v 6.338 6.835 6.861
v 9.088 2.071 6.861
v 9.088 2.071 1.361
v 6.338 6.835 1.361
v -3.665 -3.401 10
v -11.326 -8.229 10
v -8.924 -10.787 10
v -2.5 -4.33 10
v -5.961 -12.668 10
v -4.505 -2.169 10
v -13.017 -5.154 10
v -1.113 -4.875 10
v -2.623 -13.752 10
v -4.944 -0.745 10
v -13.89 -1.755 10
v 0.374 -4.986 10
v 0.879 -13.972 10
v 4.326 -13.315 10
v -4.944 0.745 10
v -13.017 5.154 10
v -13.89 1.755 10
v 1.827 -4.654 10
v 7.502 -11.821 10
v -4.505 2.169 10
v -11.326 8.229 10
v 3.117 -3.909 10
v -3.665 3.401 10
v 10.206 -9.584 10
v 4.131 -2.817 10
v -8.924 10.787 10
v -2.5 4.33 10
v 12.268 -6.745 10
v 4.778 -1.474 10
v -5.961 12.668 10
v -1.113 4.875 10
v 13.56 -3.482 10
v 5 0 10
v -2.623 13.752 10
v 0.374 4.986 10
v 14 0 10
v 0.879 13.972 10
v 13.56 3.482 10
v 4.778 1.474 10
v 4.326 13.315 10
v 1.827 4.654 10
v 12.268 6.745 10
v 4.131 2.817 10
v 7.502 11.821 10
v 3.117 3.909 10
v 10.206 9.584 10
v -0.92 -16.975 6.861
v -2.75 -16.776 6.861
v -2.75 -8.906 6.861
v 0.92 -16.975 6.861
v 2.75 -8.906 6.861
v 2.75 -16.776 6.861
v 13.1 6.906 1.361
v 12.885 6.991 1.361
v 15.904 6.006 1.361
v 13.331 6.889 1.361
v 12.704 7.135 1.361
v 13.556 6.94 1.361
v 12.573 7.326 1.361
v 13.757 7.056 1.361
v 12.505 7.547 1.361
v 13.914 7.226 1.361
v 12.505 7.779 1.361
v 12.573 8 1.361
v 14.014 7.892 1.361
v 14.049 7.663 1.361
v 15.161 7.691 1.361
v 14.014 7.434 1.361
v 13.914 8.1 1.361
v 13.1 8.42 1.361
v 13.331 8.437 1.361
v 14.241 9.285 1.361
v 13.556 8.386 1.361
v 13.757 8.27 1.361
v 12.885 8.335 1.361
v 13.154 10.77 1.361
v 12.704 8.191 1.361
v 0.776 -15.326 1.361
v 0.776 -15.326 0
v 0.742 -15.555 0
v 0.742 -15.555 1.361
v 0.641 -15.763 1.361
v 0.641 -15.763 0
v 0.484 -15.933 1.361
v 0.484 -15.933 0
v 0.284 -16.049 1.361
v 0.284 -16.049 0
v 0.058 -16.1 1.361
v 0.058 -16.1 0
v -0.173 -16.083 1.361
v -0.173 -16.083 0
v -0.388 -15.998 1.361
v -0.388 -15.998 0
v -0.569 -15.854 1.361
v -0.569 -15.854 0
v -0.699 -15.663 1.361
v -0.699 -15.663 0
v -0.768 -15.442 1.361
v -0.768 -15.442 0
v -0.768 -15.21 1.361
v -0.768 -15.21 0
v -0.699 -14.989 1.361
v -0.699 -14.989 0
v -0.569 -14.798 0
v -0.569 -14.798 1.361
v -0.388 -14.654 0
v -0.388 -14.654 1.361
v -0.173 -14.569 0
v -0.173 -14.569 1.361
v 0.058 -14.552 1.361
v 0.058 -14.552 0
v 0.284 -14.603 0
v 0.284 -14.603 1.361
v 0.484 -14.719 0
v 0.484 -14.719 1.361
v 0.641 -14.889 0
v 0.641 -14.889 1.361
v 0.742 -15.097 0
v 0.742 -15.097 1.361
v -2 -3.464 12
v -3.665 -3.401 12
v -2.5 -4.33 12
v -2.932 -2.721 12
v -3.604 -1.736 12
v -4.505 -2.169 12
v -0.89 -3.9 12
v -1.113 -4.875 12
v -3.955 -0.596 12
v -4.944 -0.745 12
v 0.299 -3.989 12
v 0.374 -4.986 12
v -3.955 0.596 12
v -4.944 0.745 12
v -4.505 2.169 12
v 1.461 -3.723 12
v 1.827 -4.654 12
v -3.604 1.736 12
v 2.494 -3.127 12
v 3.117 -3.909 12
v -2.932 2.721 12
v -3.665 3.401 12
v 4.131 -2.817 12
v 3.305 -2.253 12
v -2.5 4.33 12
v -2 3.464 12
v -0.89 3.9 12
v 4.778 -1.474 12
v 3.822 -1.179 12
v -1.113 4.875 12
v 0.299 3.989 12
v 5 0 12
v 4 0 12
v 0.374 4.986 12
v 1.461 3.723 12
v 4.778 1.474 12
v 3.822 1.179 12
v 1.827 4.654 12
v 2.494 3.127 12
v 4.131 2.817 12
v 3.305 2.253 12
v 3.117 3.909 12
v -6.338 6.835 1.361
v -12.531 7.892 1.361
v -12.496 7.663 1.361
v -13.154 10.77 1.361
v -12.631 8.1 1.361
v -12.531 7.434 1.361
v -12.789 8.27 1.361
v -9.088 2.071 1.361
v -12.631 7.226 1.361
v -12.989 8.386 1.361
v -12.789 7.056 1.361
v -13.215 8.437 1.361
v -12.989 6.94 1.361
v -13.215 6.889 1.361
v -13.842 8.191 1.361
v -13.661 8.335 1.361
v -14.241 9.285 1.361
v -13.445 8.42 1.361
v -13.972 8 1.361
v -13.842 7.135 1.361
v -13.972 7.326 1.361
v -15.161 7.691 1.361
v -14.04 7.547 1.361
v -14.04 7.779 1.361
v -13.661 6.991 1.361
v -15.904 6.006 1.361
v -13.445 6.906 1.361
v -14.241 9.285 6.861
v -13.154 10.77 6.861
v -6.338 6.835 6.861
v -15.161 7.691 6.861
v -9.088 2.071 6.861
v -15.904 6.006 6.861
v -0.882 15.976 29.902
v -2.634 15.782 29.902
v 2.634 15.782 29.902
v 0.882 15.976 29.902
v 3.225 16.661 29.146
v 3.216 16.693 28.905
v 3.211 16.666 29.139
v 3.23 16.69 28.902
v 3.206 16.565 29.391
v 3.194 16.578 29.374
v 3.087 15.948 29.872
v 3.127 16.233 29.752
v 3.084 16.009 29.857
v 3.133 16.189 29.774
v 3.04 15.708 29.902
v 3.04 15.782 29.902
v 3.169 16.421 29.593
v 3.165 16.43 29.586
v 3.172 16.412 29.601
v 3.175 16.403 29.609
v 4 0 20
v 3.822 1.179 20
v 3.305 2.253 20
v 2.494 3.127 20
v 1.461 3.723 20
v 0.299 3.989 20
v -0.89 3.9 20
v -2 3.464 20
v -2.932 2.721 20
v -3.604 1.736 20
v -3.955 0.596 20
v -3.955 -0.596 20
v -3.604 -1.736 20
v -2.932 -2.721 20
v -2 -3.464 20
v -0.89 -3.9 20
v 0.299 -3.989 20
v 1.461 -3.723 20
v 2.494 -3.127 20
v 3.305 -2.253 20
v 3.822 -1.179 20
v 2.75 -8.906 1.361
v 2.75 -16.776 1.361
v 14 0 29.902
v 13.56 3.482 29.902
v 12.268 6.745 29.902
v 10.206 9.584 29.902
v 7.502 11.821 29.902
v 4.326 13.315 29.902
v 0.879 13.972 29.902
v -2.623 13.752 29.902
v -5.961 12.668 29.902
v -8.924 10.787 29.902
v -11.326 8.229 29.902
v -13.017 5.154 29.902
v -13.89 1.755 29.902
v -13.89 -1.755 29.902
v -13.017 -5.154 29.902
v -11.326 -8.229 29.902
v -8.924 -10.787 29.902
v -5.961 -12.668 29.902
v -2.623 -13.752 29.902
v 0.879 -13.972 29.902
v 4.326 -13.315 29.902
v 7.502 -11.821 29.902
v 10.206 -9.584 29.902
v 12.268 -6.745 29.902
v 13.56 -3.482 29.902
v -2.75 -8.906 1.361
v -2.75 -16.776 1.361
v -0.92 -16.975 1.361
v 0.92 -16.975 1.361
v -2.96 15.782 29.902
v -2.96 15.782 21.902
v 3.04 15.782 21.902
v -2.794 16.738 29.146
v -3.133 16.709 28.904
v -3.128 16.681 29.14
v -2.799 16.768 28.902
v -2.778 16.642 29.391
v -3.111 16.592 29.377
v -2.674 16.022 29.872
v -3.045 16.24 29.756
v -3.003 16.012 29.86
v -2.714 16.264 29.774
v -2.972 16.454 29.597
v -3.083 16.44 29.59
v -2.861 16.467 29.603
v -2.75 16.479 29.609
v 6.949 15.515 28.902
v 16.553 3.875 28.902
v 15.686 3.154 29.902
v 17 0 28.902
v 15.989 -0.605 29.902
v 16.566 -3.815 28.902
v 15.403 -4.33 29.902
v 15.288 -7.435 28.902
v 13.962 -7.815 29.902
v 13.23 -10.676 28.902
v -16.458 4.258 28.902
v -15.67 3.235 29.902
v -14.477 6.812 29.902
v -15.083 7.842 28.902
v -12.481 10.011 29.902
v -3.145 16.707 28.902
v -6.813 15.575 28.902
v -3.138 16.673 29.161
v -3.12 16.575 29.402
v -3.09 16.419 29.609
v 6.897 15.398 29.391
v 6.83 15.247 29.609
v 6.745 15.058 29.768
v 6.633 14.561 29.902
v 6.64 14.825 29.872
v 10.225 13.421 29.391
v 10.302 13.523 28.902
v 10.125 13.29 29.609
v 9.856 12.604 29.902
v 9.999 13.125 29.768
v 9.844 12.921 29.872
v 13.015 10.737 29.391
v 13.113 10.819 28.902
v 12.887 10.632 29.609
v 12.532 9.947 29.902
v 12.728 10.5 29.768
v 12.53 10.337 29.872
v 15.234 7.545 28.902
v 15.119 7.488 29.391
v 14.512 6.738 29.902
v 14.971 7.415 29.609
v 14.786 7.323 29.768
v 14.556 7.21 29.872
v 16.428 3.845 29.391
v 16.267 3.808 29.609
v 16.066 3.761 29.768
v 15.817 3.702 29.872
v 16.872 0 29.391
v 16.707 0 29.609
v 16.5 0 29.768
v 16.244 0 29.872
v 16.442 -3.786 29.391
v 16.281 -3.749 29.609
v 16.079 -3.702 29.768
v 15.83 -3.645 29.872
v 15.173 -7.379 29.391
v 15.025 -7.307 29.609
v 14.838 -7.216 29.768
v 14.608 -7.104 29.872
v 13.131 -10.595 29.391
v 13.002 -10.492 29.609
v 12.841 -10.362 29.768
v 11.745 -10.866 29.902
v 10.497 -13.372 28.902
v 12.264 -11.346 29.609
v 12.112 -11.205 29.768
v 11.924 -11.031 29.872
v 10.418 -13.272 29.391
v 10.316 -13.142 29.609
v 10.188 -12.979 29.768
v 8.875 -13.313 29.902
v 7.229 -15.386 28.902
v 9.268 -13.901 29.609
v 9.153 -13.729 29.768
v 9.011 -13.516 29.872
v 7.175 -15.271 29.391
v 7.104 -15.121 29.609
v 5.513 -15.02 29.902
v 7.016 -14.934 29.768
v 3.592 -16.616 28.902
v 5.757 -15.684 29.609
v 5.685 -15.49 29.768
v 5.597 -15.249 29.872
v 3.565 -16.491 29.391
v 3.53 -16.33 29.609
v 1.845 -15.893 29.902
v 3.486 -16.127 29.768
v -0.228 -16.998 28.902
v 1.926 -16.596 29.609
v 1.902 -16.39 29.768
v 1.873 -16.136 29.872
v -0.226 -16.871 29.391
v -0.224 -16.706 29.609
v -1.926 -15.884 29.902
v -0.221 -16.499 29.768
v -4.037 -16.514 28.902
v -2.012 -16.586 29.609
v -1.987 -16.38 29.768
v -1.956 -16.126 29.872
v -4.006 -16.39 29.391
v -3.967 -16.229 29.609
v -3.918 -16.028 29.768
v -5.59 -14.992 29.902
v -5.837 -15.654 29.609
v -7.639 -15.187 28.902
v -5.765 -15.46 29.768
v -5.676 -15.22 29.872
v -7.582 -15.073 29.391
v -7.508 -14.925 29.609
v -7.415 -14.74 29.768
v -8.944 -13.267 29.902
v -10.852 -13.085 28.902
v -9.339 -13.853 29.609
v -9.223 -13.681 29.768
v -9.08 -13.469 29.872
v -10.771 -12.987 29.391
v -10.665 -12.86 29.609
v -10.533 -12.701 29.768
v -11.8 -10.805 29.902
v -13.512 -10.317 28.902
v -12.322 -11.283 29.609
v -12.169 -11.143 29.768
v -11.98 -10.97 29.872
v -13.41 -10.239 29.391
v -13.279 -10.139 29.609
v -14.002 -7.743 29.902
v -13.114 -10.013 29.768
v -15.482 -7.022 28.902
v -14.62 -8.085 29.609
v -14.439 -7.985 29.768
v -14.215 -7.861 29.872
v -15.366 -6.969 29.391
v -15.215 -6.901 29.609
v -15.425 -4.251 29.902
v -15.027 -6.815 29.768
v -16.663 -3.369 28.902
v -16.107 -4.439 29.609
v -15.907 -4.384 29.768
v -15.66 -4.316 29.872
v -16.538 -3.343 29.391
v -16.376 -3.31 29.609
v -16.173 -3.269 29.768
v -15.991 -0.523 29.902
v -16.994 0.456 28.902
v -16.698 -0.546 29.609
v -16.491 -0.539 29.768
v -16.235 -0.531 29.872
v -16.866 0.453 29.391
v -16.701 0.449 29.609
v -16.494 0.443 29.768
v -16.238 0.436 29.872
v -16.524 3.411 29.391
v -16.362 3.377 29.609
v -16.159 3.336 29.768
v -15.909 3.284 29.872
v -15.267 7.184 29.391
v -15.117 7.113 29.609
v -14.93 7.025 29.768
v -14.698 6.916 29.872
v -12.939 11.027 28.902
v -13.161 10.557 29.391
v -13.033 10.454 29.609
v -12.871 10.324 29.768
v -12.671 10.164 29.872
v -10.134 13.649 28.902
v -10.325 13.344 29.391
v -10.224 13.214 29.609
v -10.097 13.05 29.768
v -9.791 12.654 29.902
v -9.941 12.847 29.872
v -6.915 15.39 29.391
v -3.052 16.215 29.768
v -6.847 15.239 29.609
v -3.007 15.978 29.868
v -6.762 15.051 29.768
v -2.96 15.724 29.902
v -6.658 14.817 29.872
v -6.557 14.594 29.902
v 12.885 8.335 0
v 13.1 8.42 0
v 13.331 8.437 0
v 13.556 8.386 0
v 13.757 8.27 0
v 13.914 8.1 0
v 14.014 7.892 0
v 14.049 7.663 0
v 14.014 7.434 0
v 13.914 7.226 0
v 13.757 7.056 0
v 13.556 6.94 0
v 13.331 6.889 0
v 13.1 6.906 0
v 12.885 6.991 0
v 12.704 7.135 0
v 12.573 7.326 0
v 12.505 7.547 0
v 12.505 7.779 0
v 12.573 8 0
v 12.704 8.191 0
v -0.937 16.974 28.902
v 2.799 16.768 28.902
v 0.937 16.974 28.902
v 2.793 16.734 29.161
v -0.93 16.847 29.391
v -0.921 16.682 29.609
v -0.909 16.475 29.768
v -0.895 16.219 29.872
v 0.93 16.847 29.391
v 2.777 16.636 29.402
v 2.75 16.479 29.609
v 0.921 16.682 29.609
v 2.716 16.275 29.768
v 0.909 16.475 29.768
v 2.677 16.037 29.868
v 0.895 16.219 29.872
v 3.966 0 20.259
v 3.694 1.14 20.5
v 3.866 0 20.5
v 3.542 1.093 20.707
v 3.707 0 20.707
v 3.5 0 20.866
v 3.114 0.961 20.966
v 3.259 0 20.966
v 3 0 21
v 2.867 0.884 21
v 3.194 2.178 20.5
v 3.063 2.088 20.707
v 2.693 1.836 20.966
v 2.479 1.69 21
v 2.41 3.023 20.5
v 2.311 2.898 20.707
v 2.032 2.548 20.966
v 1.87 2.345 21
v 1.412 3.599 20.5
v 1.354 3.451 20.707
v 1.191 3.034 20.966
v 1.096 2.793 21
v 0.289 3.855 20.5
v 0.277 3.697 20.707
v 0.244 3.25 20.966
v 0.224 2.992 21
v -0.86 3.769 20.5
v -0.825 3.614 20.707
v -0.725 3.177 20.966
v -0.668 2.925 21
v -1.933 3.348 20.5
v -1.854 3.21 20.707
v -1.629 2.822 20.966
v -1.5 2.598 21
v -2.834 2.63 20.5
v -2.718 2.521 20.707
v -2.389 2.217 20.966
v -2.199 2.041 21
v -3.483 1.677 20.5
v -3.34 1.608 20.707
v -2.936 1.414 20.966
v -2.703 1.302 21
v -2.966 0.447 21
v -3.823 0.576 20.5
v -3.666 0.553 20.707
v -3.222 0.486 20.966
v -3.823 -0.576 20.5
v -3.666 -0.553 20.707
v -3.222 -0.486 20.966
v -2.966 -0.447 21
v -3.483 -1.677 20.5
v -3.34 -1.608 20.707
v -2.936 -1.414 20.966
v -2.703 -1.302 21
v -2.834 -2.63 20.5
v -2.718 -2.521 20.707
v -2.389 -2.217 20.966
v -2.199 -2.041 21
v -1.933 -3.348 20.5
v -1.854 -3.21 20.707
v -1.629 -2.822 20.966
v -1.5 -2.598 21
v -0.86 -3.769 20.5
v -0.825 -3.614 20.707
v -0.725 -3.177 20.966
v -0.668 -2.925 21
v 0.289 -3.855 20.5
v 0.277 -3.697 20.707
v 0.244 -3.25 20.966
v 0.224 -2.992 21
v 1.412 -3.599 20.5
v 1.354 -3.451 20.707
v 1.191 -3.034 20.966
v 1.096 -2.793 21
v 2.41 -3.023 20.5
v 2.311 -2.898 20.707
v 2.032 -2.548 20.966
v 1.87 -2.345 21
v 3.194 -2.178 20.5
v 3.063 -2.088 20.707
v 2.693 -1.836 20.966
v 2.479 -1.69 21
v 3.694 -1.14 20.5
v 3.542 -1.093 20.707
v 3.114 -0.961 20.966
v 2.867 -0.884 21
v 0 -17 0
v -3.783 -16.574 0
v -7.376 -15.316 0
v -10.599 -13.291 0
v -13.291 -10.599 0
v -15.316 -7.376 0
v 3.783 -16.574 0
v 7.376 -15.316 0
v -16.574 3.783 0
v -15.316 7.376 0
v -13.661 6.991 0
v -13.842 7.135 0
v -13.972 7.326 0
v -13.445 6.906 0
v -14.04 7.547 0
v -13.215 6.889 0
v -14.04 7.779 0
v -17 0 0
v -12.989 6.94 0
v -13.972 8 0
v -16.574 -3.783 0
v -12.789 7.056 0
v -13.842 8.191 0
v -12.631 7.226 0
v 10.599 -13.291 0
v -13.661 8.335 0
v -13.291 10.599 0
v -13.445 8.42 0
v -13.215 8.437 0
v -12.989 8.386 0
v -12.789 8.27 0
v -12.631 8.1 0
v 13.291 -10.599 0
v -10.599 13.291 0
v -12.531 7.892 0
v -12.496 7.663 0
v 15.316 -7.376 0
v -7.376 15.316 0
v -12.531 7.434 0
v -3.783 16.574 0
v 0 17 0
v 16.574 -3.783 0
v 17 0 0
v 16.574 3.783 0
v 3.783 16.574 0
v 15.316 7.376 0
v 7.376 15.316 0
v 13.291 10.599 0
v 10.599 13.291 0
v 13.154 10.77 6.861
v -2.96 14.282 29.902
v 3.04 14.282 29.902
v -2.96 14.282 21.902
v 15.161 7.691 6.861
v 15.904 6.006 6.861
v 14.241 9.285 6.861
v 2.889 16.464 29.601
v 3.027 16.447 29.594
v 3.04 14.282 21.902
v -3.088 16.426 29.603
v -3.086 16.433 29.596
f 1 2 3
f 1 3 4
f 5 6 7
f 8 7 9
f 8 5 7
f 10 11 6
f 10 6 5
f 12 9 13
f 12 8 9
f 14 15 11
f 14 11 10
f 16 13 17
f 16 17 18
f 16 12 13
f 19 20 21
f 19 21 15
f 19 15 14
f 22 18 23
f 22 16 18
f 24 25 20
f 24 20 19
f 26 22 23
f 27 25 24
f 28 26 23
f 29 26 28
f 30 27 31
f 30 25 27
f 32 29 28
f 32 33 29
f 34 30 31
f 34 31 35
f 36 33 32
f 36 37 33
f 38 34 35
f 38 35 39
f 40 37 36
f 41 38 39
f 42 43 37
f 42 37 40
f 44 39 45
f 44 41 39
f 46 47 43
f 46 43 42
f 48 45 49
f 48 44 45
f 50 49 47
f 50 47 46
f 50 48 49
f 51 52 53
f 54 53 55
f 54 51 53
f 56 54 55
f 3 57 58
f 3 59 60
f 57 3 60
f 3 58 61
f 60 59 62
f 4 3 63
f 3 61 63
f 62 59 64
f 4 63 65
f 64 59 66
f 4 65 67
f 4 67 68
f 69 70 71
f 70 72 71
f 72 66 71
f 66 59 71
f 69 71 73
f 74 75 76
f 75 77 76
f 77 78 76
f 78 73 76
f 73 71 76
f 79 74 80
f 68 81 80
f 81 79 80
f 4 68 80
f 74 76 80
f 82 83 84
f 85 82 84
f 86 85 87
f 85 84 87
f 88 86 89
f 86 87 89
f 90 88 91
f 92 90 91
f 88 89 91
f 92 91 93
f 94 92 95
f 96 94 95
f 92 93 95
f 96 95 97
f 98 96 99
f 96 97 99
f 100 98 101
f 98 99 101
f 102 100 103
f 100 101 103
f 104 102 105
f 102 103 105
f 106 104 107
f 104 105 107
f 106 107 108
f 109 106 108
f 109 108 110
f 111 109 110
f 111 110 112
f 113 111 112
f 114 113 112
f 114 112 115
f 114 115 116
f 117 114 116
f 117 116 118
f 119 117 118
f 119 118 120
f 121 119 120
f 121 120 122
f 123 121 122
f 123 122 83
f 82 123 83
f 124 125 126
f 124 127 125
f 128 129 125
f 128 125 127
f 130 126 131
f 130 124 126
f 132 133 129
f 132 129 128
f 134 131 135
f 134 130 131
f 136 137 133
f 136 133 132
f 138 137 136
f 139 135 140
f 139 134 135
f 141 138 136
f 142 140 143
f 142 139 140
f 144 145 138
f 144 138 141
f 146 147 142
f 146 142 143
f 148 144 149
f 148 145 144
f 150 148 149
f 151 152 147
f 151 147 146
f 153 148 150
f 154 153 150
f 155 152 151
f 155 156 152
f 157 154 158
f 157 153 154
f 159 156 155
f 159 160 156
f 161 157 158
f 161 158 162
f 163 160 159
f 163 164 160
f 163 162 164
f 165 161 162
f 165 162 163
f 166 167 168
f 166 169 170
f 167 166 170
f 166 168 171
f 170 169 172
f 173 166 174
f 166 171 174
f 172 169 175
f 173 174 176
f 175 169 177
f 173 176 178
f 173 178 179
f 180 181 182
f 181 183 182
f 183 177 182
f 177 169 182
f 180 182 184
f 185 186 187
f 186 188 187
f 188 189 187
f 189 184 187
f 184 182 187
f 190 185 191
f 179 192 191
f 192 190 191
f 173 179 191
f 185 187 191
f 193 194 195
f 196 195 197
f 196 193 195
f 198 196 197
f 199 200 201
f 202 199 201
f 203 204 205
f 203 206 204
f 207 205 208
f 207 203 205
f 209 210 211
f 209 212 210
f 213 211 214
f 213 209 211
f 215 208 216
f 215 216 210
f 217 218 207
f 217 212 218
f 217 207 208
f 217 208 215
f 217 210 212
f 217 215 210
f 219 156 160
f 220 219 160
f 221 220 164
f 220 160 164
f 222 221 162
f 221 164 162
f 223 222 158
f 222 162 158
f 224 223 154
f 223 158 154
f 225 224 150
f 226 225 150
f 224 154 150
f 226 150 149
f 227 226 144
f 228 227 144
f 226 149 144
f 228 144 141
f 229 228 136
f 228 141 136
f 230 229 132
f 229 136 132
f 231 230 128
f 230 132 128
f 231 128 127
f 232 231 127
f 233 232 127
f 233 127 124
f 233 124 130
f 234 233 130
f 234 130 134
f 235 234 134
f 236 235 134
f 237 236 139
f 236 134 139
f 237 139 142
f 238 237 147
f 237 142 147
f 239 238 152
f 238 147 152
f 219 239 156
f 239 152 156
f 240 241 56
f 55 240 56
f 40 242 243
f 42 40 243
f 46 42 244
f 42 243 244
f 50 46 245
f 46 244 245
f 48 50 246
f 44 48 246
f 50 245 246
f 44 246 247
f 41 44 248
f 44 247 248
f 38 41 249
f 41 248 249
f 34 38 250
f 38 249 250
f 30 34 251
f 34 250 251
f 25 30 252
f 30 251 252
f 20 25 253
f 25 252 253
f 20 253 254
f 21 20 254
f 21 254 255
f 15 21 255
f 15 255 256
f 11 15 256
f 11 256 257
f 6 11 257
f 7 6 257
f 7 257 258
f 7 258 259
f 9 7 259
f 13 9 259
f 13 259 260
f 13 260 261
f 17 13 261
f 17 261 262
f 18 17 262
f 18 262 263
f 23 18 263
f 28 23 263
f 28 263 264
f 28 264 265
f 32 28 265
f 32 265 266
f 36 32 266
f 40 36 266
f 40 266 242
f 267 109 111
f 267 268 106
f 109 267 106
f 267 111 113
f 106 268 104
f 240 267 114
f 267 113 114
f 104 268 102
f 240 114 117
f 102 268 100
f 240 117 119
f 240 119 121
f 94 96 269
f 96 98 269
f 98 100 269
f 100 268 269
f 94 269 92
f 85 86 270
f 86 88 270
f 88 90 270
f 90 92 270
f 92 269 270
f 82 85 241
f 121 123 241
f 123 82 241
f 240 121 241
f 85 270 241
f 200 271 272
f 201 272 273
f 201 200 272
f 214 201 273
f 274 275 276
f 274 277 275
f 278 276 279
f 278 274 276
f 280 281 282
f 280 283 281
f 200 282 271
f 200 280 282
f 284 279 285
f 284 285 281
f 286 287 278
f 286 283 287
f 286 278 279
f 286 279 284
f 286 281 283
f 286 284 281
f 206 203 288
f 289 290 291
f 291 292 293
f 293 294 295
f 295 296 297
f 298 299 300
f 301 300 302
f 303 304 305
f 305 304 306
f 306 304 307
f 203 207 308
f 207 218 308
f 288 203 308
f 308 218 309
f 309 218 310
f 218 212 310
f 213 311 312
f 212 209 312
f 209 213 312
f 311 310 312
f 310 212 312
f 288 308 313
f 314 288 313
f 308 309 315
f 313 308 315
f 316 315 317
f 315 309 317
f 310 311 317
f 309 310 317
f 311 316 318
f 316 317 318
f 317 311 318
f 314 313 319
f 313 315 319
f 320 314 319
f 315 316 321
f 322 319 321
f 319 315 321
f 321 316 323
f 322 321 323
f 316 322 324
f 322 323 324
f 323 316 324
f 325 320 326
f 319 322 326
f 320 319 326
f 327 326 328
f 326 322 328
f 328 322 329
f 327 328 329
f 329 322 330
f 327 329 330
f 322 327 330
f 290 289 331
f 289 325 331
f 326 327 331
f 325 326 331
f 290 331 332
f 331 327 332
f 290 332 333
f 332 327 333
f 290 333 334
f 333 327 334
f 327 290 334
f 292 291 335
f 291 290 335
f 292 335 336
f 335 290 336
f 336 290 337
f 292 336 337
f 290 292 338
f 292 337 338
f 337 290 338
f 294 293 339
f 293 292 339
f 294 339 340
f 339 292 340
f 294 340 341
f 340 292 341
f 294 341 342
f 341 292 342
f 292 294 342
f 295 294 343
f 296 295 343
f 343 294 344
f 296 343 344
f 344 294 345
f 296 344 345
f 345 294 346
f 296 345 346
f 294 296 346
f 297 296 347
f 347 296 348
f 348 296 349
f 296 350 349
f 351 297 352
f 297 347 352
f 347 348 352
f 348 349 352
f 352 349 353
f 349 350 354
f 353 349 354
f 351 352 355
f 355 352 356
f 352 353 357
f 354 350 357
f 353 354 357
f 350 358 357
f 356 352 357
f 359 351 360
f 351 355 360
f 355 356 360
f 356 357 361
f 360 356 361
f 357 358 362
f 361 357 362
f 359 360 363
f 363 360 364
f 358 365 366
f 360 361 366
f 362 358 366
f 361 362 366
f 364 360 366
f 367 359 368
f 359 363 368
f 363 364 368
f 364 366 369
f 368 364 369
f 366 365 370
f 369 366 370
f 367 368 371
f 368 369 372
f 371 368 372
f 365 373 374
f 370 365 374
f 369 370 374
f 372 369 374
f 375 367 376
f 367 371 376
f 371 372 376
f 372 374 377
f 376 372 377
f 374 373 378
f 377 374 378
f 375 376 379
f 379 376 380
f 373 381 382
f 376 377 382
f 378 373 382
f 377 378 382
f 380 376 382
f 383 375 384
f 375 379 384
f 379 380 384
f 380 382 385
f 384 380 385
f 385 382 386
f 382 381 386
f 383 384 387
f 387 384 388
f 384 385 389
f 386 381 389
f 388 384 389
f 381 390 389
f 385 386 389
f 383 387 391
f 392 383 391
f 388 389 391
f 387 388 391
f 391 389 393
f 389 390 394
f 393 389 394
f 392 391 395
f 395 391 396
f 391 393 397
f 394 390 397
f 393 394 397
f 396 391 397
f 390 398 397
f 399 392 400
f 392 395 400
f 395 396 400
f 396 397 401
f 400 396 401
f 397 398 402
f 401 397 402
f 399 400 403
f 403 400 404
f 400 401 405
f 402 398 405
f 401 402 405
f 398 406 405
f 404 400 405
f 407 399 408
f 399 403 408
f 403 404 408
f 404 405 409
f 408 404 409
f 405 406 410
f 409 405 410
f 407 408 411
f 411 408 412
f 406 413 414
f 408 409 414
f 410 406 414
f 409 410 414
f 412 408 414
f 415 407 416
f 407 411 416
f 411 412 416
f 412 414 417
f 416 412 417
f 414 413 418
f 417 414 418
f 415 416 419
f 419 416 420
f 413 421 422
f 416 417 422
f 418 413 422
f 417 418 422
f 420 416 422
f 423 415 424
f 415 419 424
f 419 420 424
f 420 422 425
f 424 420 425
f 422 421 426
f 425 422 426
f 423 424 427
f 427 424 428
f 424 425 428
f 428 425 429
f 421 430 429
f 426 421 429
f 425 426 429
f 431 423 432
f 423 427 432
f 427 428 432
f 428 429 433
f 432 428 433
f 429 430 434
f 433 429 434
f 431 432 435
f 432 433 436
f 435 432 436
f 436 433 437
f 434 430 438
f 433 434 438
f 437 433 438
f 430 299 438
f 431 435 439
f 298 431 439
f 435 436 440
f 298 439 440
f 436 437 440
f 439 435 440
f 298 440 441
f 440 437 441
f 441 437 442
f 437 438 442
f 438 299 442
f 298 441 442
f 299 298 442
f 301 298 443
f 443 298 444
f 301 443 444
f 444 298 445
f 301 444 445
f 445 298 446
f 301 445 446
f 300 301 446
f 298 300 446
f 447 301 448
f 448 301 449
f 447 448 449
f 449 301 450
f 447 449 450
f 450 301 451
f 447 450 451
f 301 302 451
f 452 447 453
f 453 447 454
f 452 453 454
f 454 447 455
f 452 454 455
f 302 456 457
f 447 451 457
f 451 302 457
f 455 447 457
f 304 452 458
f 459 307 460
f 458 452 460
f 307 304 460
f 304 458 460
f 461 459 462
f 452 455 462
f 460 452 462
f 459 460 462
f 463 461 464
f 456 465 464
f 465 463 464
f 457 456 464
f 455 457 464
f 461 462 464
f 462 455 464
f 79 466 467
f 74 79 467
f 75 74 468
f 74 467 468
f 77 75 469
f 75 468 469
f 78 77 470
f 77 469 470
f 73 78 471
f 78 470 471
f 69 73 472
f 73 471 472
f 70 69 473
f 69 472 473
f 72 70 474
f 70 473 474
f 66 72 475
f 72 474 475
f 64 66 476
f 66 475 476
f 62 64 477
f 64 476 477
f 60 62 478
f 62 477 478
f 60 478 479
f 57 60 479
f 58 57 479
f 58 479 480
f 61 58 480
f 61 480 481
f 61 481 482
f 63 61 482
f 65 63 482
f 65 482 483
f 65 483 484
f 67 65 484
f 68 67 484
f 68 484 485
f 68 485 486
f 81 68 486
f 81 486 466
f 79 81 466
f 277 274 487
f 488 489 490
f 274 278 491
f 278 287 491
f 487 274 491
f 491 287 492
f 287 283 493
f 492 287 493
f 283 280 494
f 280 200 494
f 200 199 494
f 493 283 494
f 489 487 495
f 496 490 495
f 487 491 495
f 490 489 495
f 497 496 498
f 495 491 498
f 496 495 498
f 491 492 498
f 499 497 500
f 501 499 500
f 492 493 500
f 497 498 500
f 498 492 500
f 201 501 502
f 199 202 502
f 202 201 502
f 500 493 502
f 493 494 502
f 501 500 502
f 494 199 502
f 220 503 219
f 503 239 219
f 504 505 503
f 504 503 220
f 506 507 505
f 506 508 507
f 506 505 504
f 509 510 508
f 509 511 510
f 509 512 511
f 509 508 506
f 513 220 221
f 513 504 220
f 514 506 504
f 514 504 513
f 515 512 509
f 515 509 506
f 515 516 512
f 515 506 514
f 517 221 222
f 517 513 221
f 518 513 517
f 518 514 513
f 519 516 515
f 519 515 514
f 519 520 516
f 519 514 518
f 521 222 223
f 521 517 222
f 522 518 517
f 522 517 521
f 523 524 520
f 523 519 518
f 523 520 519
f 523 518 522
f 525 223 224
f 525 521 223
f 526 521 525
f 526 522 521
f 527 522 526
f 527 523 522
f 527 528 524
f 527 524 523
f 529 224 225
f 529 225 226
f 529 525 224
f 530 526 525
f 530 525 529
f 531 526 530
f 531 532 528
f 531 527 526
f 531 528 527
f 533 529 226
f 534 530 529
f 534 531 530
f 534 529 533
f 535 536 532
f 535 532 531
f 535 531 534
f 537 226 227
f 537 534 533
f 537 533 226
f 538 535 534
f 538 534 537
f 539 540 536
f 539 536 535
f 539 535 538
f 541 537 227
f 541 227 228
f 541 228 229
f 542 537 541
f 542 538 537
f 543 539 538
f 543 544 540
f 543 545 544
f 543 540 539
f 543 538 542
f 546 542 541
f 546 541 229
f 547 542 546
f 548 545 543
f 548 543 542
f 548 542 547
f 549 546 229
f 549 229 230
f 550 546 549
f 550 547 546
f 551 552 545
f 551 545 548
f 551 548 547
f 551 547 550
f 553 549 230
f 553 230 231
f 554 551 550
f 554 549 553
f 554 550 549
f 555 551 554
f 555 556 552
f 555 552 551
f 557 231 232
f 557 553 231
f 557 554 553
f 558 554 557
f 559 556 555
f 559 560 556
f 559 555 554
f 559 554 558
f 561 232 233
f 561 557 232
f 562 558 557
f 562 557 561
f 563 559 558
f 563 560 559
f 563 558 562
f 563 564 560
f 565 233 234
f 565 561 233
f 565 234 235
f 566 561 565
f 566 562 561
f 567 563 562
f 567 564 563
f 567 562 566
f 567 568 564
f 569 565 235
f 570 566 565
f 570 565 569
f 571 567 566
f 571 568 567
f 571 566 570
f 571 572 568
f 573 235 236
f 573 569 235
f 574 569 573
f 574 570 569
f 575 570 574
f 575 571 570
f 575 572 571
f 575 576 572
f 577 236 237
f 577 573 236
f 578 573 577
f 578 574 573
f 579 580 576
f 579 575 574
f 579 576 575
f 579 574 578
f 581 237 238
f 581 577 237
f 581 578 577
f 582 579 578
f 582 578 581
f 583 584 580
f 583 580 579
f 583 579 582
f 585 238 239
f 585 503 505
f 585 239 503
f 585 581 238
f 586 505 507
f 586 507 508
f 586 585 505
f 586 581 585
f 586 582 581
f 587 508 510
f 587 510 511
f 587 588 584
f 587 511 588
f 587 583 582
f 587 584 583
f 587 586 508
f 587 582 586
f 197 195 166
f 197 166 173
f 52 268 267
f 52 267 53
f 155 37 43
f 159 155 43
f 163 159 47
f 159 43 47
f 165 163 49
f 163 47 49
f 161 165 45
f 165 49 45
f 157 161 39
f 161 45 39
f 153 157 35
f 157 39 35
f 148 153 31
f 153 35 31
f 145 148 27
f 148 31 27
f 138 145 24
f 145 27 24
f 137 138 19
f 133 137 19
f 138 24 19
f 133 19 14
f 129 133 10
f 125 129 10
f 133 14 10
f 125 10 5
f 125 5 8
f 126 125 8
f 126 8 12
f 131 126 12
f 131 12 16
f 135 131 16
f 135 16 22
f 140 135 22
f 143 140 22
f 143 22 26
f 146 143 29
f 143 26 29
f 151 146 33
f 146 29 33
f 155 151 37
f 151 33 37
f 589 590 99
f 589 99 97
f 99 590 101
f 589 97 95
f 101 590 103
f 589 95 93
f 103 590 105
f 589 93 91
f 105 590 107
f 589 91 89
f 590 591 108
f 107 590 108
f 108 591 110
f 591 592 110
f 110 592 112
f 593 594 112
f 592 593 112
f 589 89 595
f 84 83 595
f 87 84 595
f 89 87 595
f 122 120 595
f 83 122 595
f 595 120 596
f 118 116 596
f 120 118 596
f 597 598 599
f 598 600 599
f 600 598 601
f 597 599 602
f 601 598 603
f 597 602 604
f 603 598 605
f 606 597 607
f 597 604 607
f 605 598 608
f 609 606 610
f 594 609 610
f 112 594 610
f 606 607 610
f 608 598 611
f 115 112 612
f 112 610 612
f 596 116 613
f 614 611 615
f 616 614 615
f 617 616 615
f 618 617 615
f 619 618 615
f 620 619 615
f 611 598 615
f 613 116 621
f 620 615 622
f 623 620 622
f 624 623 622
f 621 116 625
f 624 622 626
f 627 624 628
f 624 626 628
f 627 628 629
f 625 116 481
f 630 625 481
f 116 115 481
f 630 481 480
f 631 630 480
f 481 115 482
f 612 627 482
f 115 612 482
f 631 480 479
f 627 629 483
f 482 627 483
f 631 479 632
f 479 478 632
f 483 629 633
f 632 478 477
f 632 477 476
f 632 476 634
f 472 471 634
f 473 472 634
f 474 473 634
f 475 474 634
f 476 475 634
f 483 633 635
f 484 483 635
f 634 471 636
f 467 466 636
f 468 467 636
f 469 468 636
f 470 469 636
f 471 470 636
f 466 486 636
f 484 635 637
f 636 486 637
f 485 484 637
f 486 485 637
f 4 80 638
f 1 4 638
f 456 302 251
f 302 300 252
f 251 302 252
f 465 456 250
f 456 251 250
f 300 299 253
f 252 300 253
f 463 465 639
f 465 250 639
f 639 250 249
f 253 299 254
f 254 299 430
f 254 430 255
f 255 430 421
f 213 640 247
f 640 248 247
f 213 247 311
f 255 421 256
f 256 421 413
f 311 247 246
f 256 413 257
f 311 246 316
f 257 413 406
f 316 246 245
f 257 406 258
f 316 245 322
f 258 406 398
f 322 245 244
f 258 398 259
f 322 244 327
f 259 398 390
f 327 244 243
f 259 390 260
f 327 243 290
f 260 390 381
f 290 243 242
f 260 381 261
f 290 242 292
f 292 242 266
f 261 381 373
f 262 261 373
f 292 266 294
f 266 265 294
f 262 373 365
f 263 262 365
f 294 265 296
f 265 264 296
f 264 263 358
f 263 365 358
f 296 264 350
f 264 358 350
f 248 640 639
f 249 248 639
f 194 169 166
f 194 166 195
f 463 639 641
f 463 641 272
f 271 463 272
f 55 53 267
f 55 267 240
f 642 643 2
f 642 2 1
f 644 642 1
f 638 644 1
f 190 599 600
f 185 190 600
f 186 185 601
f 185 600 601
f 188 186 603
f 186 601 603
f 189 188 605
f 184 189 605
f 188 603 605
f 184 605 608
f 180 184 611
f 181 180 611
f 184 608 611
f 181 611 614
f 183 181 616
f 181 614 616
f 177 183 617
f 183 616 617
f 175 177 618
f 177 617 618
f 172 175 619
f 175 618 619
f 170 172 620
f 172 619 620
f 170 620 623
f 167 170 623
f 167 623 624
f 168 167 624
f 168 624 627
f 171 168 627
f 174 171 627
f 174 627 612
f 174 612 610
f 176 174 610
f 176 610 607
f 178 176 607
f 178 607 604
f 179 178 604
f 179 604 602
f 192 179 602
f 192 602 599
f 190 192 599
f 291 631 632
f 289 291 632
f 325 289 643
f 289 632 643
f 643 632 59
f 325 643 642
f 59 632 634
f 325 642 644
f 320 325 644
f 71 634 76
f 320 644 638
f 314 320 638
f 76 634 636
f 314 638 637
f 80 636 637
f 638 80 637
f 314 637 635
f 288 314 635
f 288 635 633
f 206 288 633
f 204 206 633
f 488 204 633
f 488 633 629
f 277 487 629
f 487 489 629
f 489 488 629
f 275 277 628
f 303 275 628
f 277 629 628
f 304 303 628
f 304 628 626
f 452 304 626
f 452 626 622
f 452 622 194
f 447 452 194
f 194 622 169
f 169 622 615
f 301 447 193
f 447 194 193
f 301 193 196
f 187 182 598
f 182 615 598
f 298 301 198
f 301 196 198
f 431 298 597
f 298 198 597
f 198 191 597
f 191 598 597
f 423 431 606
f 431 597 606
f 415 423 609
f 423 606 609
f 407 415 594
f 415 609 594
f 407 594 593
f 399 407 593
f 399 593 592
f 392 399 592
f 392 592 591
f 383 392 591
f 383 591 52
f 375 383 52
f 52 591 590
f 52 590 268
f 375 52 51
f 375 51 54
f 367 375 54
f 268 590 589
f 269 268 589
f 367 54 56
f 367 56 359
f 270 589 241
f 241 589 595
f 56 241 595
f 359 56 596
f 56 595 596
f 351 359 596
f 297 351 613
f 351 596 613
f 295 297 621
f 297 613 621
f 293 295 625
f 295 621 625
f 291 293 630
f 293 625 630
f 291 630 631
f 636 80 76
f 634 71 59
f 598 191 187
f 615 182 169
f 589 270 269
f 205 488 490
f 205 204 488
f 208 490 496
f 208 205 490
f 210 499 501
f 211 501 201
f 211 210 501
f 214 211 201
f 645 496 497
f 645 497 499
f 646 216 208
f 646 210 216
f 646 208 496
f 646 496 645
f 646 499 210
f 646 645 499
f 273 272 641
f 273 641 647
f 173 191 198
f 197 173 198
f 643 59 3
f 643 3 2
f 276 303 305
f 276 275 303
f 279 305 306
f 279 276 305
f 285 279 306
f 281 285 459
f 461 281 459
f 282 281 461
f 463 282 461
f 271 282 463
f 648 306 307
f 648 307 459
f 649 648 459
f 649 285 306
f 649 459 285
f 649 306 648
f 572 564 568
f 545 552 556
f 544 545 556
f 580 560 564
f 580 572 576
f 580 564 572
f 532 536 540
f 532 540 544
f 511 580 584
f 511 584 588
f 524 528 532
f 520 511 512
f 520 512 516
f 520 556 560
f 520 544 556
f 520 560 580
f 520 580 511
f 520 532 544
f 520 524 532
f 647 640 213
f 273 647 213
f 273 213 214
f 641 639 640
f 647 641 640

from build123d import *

# Parameters (mm, degrees)
SKETCH_R              = 17
PAD_DEPTH             = 30
SKETCH001_R           = 14
POCKET_DEPTH          = 20
SKETCH002_R           = 5
PAD001_DEPTH          = 2
SKETCH003_R           = 4
PAD002_DEPTH          = 9
FILLET_R              = 1
SKETCH004_W           = 47.033489
SKETCH004_H           = 47.446069
PAD003_DEPTH          = 10
SKETCH005_W           = 5.5
SKETCH005_H           = 5.5
POCKET001_DEPTH       = 15
POLARPATTERN_COUNT    = 3
SKETCH006_W           = 48.40057
SKETCH006_H           = 10.44081
POCKET002_DEPTH       = 47.447069
SKETCH007_W           = 6
SKETCH007_H           = 1.5
POCKET003_DEPTH       = 8
SKETCH008_R           = 0.776248
POCKET004_DEPTH       = 5
POLARPATTERN001_COUNT = 3
FILLET001_R           = 1


with BuildPart() as part:
    # Sketch → Pad (new body)
    with BuildSketch(Plane.XY):
        Circle(SKETCH_R)
    extrude(amount=PAD_DEPTH)

    # Sketch001 (on Face3 of Pad) → Pocket (cut)
    with BuildSketch(Plane.XY.offset(30)):
        Circle(SKETCH001_R)
    extrude(amount=-POCKET_DEPTH, mode=Mode.SUBTRACT)

    # Sketch002 (on Face5 of Pocket) → Pad001 (join)
    with BuildSketch(Plane.XY.offset(10)):
        Circle(SKETCH002_R)
    extrude(amount=PAD001_DEPTH)

    # Sketch003 (on Face7 of Pad001) → Pad002 (join)
    with BuildSketch(Plane.XY.offset(12)):
        Circle(SKETCH003_R)
    extrude(amount=PAD002_DEPTH)

    # Fillet
    fillet_edges = [part.edges().sort_by_distance(p)[0] for p in [
        (-4, 0, 21),
    ]]
    fillet(fillet_edges, radius=FILLET_R)

    # Sketch004 (on Face8 of Fillet) → Pad003 (join)
    with BuildSketch(Plane.XY.offset(30)):
        with Locations((0.145404, -0.183003)):
            Rectangle(SKETCH004_W, SKETCH004_H)
    extrude(amount=PAD003_DEPTH)

    # Sketch005 (on Face6 of Pad003) → Pocket001 (cut)
    with BuildSketch(Plane.XZ.offset(23.906038)):
        with Locations((0, 4.110798)):
            Rectangle(SKETCH005_W, SKETCH005_H)
    pocket001 = extrude(amount=-POCKET001_DEPTH, mode=Mode.SUBTRACT)

    # PolarPattern: Pocket001 ×3 about axis
    polarpattern_axis = Axis((0, 0, 0), (0, 0, 1))
    for i in range(1, POLARPATTERN_COUNT):
        add(pocket001.rotate(polarpattern_axis, i * 360 / POLARPATTERN_COUNT), mode=Mode.SUBTRACT)

    # Sketch006 (on Face6 of PolarPattern) → Pocket002 (cut, through all)
    with BuildSketch(Plane.XZ.offset(23.906038)):
        with Locations((0.264744, 35.122468)):
            Rectangle(SKETCH006_W, SKETCH006_H)
    extrude(amount=-POCKET002_DEPTH, mode=Mode.SUBTRACT)

    # Sketch007 (on Face2 of Pocket002) → Pocket003 (cut)
    with BuildSketch(Plane.XY.offset(29.902063)):
        with Locations((0.040436, 15.031708)):
            Rectangle(SKETCH007_W, SKETCH007_H)
    extrude(amount=-POCKET003_DEPTH, mode=Mode.SUBTRACT)

    # Sketch008 (on Face3 of Pocket003) → Pocket004 (cut)
    with BuildSketch(Plane(origin=(0, 0, 0), x_dir=(1, 0, 0), z_dir=(0, 0, -1))):
        with Locations((0, 15.325977)):
            Circle(SKETCH008_R)
    pocket004 = extrude(amount=-POCKET004_DEPTH, mode=Mode.SUBTRACT)

    # PolarPattern001: Pocket004 ×3 about axis
    polarpattern001_axis = Axis((0, 0, 0), (0, 0, -1))
    for i in range(1, POLARPATTERN001_COUNT):
        add(pocket004.rotate(polarpattern001_axis, i * 360 / POLARPATTERN001_COUNT), mode=Mode.SUBTRACT)

    # Fillet001
    fillet001_edges = [part.edges().sort_by_distance(p)[0] for p in [
        (-17, 0, 29.902063),
    ]]
    fillet(fillet001_edges, radius=FILLET001_R)


solid = part.part
